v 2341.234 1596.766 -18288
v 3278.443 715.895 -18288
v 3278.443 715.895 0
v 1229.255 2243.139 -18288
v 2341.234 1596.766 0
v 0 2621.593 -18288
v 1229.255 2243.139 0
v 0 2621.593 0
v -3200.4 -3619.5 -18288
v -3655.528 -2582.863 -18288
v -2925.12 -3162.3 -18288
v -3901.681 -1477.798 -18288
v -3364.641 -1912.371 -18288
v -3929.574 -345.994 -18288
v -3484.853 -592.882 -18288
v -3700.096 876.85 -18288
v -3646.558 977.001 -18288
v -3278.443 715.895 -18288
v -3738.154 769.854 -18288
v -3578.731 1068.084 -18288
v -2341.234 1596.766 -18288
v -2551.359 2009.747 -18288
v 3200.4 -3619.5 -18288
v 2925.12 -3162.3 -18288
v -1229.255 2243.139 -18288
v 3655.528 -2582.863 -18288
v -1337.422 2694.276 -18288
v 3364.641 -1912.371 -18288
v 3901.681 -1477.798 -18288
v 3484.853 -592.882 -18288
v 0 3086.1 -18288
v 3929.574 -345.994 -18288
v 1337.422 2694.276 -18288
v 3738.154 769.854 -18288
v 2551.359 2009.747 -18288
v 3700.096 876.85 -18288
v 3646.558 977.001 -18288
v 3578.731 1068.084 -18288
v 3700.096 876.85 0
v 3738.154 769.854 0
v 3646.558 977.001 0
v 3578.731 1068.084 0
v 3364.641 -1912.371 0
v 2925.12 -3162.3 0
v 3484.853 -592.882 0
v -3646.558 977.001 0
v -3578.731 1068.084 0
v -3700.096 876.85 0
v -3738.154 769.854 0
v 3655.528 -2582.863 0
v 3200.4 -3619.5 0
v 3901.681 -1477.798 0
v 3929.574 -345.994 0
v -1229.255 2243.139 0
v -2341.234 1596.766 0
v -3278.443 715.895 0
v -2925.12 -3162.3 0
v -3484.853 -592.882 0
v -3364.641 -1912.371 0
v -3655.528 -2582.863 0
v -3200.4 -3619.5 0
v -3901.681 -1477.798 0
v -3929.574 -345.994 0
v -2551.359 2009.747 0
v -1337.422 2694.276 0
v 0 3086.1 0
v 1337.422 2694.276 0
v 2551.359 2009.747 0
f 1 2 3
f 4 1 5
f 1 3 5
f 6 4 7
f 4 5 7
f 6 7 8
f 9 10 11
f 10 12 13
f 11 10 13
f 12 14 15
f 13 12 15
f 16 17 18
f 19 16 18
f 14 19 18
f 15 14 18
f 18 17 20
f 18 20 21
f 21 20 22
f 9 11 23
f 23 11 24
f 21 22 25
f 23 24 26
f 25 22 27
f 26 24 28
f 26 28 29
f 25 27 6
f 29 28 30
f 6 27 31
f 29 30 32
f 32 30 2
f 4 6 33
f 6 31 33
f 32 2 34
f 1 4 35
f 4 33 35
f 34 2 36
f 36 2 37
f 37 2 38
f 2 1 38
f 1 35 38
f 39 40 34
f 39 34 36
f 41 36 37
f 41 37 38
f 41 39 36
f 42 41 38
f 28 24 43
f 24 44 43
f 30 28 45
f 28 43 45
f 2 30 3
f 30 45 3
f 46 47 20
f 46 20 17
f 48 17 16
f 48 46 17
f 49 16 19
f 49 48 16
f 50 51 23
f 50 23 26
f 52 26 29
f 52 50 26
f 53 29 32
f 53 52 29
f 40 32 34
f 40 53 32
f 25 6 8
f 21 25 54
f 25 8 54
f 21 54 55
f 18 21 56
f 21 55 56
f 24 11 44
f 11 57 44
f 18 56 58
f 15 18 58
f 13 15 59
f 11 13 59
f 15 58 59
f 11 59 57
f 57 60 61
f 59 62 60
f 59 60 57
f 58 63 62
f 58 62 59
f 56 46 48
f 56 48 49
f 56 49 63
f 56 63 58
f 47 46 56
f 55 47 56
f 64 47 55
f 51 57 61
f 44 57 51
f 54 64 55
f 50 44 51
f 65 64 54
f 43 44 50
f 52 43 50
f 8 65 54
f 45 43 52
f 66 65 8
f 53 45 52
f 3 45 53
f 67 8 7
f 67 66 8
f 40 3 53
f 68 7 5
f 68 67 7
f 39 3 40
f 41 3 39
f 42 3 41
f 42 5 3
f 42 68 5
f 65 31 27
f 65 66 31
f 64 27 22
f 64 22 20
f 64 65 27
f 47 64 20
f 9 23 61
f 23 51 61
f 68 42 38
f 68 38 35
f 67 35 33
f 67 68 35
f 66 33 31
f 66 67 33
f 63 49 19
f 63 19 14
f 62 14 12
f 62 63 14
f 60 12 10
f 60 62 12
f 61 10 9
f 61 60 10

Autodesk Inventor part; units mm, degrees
ref_plane "YZ Plane" through (0, 0, 0) normal (1, 0, 0) x (0, 1, 0)
ref_plane "XZ Plane" through (0, 0, 0) normal (0, 1, 0) x (-1, 0, 0)
ref_plane "XY Plane" through (0, 0, 0) normal (0, 0, 1) x (1, 0, 0)
sketch "Sketch3" plane through (0, 0, 0) normal (0, 0, 1) x (1, 0, 0)
  line L0 (3200.4, -3619.5) -> (-3200.4, -3619.5)
  line L1 (0, -3619.5) -> (0, 3086.1) construction
  arc A0 (-3738.1541, 769.8538) -> (-3200.4, -3619.5) centre (1884.0877, -768.9648) ccw
  arc A1 (0, 3086.1) -> (-3578.7308, 1068.0837) centre (1038.9488, -2938.6136) ccw
  arc A2 (-3578.7308, 1068.0837) -> (-3738.1541, 769.8538) centre (-3003.1863, 568.6916) ccw
  arc A3 (3200.4, -3619.5) -> (3738.1541, 769.8538) centre (-1884.0877, -768.9648) ccw
  arc A4 (3578.7308, 1068.0837) -> (0, 3086.1) centre (-1038.9488, -2938.6136) ccw
  arc A5 (3738.1541, 769.8538) -> (3578.7308, 1068.0837) centre (3003.1863, 568.6916) ccw
  arc A6 (-3278.4432, 715.8952) -> (-2925.1203, -3162.3) centre (1884.0877, -768.9648) ccw
  line L2 (-2925.1203, -3162.3) -> (2925.1203, -3162.3)
  arc A7 (2925.1203, -3162.3) -> (3278.4432, 715.8952) centre (-1884.0877, -768.9648) ccw
  arc A8 (3278.4432, 715.8952) -> (0, 2621.5927) centre (-1038.9488, -2938.6136) ccw
  arc A9 (0, 2621.5927) -> (-3278.4432, 715.8952) centre (1038.9488, -2938.6136) ccw
  dimension "d3" = 6400.8
  dimension "d4" = 6705.6
  dimension "d5" = 762
  dimension "d6" = 457.2
extrude "Extrusion1" add sketch "Sketch3" against normal blind 18288
properties material "Steel, Mild"
